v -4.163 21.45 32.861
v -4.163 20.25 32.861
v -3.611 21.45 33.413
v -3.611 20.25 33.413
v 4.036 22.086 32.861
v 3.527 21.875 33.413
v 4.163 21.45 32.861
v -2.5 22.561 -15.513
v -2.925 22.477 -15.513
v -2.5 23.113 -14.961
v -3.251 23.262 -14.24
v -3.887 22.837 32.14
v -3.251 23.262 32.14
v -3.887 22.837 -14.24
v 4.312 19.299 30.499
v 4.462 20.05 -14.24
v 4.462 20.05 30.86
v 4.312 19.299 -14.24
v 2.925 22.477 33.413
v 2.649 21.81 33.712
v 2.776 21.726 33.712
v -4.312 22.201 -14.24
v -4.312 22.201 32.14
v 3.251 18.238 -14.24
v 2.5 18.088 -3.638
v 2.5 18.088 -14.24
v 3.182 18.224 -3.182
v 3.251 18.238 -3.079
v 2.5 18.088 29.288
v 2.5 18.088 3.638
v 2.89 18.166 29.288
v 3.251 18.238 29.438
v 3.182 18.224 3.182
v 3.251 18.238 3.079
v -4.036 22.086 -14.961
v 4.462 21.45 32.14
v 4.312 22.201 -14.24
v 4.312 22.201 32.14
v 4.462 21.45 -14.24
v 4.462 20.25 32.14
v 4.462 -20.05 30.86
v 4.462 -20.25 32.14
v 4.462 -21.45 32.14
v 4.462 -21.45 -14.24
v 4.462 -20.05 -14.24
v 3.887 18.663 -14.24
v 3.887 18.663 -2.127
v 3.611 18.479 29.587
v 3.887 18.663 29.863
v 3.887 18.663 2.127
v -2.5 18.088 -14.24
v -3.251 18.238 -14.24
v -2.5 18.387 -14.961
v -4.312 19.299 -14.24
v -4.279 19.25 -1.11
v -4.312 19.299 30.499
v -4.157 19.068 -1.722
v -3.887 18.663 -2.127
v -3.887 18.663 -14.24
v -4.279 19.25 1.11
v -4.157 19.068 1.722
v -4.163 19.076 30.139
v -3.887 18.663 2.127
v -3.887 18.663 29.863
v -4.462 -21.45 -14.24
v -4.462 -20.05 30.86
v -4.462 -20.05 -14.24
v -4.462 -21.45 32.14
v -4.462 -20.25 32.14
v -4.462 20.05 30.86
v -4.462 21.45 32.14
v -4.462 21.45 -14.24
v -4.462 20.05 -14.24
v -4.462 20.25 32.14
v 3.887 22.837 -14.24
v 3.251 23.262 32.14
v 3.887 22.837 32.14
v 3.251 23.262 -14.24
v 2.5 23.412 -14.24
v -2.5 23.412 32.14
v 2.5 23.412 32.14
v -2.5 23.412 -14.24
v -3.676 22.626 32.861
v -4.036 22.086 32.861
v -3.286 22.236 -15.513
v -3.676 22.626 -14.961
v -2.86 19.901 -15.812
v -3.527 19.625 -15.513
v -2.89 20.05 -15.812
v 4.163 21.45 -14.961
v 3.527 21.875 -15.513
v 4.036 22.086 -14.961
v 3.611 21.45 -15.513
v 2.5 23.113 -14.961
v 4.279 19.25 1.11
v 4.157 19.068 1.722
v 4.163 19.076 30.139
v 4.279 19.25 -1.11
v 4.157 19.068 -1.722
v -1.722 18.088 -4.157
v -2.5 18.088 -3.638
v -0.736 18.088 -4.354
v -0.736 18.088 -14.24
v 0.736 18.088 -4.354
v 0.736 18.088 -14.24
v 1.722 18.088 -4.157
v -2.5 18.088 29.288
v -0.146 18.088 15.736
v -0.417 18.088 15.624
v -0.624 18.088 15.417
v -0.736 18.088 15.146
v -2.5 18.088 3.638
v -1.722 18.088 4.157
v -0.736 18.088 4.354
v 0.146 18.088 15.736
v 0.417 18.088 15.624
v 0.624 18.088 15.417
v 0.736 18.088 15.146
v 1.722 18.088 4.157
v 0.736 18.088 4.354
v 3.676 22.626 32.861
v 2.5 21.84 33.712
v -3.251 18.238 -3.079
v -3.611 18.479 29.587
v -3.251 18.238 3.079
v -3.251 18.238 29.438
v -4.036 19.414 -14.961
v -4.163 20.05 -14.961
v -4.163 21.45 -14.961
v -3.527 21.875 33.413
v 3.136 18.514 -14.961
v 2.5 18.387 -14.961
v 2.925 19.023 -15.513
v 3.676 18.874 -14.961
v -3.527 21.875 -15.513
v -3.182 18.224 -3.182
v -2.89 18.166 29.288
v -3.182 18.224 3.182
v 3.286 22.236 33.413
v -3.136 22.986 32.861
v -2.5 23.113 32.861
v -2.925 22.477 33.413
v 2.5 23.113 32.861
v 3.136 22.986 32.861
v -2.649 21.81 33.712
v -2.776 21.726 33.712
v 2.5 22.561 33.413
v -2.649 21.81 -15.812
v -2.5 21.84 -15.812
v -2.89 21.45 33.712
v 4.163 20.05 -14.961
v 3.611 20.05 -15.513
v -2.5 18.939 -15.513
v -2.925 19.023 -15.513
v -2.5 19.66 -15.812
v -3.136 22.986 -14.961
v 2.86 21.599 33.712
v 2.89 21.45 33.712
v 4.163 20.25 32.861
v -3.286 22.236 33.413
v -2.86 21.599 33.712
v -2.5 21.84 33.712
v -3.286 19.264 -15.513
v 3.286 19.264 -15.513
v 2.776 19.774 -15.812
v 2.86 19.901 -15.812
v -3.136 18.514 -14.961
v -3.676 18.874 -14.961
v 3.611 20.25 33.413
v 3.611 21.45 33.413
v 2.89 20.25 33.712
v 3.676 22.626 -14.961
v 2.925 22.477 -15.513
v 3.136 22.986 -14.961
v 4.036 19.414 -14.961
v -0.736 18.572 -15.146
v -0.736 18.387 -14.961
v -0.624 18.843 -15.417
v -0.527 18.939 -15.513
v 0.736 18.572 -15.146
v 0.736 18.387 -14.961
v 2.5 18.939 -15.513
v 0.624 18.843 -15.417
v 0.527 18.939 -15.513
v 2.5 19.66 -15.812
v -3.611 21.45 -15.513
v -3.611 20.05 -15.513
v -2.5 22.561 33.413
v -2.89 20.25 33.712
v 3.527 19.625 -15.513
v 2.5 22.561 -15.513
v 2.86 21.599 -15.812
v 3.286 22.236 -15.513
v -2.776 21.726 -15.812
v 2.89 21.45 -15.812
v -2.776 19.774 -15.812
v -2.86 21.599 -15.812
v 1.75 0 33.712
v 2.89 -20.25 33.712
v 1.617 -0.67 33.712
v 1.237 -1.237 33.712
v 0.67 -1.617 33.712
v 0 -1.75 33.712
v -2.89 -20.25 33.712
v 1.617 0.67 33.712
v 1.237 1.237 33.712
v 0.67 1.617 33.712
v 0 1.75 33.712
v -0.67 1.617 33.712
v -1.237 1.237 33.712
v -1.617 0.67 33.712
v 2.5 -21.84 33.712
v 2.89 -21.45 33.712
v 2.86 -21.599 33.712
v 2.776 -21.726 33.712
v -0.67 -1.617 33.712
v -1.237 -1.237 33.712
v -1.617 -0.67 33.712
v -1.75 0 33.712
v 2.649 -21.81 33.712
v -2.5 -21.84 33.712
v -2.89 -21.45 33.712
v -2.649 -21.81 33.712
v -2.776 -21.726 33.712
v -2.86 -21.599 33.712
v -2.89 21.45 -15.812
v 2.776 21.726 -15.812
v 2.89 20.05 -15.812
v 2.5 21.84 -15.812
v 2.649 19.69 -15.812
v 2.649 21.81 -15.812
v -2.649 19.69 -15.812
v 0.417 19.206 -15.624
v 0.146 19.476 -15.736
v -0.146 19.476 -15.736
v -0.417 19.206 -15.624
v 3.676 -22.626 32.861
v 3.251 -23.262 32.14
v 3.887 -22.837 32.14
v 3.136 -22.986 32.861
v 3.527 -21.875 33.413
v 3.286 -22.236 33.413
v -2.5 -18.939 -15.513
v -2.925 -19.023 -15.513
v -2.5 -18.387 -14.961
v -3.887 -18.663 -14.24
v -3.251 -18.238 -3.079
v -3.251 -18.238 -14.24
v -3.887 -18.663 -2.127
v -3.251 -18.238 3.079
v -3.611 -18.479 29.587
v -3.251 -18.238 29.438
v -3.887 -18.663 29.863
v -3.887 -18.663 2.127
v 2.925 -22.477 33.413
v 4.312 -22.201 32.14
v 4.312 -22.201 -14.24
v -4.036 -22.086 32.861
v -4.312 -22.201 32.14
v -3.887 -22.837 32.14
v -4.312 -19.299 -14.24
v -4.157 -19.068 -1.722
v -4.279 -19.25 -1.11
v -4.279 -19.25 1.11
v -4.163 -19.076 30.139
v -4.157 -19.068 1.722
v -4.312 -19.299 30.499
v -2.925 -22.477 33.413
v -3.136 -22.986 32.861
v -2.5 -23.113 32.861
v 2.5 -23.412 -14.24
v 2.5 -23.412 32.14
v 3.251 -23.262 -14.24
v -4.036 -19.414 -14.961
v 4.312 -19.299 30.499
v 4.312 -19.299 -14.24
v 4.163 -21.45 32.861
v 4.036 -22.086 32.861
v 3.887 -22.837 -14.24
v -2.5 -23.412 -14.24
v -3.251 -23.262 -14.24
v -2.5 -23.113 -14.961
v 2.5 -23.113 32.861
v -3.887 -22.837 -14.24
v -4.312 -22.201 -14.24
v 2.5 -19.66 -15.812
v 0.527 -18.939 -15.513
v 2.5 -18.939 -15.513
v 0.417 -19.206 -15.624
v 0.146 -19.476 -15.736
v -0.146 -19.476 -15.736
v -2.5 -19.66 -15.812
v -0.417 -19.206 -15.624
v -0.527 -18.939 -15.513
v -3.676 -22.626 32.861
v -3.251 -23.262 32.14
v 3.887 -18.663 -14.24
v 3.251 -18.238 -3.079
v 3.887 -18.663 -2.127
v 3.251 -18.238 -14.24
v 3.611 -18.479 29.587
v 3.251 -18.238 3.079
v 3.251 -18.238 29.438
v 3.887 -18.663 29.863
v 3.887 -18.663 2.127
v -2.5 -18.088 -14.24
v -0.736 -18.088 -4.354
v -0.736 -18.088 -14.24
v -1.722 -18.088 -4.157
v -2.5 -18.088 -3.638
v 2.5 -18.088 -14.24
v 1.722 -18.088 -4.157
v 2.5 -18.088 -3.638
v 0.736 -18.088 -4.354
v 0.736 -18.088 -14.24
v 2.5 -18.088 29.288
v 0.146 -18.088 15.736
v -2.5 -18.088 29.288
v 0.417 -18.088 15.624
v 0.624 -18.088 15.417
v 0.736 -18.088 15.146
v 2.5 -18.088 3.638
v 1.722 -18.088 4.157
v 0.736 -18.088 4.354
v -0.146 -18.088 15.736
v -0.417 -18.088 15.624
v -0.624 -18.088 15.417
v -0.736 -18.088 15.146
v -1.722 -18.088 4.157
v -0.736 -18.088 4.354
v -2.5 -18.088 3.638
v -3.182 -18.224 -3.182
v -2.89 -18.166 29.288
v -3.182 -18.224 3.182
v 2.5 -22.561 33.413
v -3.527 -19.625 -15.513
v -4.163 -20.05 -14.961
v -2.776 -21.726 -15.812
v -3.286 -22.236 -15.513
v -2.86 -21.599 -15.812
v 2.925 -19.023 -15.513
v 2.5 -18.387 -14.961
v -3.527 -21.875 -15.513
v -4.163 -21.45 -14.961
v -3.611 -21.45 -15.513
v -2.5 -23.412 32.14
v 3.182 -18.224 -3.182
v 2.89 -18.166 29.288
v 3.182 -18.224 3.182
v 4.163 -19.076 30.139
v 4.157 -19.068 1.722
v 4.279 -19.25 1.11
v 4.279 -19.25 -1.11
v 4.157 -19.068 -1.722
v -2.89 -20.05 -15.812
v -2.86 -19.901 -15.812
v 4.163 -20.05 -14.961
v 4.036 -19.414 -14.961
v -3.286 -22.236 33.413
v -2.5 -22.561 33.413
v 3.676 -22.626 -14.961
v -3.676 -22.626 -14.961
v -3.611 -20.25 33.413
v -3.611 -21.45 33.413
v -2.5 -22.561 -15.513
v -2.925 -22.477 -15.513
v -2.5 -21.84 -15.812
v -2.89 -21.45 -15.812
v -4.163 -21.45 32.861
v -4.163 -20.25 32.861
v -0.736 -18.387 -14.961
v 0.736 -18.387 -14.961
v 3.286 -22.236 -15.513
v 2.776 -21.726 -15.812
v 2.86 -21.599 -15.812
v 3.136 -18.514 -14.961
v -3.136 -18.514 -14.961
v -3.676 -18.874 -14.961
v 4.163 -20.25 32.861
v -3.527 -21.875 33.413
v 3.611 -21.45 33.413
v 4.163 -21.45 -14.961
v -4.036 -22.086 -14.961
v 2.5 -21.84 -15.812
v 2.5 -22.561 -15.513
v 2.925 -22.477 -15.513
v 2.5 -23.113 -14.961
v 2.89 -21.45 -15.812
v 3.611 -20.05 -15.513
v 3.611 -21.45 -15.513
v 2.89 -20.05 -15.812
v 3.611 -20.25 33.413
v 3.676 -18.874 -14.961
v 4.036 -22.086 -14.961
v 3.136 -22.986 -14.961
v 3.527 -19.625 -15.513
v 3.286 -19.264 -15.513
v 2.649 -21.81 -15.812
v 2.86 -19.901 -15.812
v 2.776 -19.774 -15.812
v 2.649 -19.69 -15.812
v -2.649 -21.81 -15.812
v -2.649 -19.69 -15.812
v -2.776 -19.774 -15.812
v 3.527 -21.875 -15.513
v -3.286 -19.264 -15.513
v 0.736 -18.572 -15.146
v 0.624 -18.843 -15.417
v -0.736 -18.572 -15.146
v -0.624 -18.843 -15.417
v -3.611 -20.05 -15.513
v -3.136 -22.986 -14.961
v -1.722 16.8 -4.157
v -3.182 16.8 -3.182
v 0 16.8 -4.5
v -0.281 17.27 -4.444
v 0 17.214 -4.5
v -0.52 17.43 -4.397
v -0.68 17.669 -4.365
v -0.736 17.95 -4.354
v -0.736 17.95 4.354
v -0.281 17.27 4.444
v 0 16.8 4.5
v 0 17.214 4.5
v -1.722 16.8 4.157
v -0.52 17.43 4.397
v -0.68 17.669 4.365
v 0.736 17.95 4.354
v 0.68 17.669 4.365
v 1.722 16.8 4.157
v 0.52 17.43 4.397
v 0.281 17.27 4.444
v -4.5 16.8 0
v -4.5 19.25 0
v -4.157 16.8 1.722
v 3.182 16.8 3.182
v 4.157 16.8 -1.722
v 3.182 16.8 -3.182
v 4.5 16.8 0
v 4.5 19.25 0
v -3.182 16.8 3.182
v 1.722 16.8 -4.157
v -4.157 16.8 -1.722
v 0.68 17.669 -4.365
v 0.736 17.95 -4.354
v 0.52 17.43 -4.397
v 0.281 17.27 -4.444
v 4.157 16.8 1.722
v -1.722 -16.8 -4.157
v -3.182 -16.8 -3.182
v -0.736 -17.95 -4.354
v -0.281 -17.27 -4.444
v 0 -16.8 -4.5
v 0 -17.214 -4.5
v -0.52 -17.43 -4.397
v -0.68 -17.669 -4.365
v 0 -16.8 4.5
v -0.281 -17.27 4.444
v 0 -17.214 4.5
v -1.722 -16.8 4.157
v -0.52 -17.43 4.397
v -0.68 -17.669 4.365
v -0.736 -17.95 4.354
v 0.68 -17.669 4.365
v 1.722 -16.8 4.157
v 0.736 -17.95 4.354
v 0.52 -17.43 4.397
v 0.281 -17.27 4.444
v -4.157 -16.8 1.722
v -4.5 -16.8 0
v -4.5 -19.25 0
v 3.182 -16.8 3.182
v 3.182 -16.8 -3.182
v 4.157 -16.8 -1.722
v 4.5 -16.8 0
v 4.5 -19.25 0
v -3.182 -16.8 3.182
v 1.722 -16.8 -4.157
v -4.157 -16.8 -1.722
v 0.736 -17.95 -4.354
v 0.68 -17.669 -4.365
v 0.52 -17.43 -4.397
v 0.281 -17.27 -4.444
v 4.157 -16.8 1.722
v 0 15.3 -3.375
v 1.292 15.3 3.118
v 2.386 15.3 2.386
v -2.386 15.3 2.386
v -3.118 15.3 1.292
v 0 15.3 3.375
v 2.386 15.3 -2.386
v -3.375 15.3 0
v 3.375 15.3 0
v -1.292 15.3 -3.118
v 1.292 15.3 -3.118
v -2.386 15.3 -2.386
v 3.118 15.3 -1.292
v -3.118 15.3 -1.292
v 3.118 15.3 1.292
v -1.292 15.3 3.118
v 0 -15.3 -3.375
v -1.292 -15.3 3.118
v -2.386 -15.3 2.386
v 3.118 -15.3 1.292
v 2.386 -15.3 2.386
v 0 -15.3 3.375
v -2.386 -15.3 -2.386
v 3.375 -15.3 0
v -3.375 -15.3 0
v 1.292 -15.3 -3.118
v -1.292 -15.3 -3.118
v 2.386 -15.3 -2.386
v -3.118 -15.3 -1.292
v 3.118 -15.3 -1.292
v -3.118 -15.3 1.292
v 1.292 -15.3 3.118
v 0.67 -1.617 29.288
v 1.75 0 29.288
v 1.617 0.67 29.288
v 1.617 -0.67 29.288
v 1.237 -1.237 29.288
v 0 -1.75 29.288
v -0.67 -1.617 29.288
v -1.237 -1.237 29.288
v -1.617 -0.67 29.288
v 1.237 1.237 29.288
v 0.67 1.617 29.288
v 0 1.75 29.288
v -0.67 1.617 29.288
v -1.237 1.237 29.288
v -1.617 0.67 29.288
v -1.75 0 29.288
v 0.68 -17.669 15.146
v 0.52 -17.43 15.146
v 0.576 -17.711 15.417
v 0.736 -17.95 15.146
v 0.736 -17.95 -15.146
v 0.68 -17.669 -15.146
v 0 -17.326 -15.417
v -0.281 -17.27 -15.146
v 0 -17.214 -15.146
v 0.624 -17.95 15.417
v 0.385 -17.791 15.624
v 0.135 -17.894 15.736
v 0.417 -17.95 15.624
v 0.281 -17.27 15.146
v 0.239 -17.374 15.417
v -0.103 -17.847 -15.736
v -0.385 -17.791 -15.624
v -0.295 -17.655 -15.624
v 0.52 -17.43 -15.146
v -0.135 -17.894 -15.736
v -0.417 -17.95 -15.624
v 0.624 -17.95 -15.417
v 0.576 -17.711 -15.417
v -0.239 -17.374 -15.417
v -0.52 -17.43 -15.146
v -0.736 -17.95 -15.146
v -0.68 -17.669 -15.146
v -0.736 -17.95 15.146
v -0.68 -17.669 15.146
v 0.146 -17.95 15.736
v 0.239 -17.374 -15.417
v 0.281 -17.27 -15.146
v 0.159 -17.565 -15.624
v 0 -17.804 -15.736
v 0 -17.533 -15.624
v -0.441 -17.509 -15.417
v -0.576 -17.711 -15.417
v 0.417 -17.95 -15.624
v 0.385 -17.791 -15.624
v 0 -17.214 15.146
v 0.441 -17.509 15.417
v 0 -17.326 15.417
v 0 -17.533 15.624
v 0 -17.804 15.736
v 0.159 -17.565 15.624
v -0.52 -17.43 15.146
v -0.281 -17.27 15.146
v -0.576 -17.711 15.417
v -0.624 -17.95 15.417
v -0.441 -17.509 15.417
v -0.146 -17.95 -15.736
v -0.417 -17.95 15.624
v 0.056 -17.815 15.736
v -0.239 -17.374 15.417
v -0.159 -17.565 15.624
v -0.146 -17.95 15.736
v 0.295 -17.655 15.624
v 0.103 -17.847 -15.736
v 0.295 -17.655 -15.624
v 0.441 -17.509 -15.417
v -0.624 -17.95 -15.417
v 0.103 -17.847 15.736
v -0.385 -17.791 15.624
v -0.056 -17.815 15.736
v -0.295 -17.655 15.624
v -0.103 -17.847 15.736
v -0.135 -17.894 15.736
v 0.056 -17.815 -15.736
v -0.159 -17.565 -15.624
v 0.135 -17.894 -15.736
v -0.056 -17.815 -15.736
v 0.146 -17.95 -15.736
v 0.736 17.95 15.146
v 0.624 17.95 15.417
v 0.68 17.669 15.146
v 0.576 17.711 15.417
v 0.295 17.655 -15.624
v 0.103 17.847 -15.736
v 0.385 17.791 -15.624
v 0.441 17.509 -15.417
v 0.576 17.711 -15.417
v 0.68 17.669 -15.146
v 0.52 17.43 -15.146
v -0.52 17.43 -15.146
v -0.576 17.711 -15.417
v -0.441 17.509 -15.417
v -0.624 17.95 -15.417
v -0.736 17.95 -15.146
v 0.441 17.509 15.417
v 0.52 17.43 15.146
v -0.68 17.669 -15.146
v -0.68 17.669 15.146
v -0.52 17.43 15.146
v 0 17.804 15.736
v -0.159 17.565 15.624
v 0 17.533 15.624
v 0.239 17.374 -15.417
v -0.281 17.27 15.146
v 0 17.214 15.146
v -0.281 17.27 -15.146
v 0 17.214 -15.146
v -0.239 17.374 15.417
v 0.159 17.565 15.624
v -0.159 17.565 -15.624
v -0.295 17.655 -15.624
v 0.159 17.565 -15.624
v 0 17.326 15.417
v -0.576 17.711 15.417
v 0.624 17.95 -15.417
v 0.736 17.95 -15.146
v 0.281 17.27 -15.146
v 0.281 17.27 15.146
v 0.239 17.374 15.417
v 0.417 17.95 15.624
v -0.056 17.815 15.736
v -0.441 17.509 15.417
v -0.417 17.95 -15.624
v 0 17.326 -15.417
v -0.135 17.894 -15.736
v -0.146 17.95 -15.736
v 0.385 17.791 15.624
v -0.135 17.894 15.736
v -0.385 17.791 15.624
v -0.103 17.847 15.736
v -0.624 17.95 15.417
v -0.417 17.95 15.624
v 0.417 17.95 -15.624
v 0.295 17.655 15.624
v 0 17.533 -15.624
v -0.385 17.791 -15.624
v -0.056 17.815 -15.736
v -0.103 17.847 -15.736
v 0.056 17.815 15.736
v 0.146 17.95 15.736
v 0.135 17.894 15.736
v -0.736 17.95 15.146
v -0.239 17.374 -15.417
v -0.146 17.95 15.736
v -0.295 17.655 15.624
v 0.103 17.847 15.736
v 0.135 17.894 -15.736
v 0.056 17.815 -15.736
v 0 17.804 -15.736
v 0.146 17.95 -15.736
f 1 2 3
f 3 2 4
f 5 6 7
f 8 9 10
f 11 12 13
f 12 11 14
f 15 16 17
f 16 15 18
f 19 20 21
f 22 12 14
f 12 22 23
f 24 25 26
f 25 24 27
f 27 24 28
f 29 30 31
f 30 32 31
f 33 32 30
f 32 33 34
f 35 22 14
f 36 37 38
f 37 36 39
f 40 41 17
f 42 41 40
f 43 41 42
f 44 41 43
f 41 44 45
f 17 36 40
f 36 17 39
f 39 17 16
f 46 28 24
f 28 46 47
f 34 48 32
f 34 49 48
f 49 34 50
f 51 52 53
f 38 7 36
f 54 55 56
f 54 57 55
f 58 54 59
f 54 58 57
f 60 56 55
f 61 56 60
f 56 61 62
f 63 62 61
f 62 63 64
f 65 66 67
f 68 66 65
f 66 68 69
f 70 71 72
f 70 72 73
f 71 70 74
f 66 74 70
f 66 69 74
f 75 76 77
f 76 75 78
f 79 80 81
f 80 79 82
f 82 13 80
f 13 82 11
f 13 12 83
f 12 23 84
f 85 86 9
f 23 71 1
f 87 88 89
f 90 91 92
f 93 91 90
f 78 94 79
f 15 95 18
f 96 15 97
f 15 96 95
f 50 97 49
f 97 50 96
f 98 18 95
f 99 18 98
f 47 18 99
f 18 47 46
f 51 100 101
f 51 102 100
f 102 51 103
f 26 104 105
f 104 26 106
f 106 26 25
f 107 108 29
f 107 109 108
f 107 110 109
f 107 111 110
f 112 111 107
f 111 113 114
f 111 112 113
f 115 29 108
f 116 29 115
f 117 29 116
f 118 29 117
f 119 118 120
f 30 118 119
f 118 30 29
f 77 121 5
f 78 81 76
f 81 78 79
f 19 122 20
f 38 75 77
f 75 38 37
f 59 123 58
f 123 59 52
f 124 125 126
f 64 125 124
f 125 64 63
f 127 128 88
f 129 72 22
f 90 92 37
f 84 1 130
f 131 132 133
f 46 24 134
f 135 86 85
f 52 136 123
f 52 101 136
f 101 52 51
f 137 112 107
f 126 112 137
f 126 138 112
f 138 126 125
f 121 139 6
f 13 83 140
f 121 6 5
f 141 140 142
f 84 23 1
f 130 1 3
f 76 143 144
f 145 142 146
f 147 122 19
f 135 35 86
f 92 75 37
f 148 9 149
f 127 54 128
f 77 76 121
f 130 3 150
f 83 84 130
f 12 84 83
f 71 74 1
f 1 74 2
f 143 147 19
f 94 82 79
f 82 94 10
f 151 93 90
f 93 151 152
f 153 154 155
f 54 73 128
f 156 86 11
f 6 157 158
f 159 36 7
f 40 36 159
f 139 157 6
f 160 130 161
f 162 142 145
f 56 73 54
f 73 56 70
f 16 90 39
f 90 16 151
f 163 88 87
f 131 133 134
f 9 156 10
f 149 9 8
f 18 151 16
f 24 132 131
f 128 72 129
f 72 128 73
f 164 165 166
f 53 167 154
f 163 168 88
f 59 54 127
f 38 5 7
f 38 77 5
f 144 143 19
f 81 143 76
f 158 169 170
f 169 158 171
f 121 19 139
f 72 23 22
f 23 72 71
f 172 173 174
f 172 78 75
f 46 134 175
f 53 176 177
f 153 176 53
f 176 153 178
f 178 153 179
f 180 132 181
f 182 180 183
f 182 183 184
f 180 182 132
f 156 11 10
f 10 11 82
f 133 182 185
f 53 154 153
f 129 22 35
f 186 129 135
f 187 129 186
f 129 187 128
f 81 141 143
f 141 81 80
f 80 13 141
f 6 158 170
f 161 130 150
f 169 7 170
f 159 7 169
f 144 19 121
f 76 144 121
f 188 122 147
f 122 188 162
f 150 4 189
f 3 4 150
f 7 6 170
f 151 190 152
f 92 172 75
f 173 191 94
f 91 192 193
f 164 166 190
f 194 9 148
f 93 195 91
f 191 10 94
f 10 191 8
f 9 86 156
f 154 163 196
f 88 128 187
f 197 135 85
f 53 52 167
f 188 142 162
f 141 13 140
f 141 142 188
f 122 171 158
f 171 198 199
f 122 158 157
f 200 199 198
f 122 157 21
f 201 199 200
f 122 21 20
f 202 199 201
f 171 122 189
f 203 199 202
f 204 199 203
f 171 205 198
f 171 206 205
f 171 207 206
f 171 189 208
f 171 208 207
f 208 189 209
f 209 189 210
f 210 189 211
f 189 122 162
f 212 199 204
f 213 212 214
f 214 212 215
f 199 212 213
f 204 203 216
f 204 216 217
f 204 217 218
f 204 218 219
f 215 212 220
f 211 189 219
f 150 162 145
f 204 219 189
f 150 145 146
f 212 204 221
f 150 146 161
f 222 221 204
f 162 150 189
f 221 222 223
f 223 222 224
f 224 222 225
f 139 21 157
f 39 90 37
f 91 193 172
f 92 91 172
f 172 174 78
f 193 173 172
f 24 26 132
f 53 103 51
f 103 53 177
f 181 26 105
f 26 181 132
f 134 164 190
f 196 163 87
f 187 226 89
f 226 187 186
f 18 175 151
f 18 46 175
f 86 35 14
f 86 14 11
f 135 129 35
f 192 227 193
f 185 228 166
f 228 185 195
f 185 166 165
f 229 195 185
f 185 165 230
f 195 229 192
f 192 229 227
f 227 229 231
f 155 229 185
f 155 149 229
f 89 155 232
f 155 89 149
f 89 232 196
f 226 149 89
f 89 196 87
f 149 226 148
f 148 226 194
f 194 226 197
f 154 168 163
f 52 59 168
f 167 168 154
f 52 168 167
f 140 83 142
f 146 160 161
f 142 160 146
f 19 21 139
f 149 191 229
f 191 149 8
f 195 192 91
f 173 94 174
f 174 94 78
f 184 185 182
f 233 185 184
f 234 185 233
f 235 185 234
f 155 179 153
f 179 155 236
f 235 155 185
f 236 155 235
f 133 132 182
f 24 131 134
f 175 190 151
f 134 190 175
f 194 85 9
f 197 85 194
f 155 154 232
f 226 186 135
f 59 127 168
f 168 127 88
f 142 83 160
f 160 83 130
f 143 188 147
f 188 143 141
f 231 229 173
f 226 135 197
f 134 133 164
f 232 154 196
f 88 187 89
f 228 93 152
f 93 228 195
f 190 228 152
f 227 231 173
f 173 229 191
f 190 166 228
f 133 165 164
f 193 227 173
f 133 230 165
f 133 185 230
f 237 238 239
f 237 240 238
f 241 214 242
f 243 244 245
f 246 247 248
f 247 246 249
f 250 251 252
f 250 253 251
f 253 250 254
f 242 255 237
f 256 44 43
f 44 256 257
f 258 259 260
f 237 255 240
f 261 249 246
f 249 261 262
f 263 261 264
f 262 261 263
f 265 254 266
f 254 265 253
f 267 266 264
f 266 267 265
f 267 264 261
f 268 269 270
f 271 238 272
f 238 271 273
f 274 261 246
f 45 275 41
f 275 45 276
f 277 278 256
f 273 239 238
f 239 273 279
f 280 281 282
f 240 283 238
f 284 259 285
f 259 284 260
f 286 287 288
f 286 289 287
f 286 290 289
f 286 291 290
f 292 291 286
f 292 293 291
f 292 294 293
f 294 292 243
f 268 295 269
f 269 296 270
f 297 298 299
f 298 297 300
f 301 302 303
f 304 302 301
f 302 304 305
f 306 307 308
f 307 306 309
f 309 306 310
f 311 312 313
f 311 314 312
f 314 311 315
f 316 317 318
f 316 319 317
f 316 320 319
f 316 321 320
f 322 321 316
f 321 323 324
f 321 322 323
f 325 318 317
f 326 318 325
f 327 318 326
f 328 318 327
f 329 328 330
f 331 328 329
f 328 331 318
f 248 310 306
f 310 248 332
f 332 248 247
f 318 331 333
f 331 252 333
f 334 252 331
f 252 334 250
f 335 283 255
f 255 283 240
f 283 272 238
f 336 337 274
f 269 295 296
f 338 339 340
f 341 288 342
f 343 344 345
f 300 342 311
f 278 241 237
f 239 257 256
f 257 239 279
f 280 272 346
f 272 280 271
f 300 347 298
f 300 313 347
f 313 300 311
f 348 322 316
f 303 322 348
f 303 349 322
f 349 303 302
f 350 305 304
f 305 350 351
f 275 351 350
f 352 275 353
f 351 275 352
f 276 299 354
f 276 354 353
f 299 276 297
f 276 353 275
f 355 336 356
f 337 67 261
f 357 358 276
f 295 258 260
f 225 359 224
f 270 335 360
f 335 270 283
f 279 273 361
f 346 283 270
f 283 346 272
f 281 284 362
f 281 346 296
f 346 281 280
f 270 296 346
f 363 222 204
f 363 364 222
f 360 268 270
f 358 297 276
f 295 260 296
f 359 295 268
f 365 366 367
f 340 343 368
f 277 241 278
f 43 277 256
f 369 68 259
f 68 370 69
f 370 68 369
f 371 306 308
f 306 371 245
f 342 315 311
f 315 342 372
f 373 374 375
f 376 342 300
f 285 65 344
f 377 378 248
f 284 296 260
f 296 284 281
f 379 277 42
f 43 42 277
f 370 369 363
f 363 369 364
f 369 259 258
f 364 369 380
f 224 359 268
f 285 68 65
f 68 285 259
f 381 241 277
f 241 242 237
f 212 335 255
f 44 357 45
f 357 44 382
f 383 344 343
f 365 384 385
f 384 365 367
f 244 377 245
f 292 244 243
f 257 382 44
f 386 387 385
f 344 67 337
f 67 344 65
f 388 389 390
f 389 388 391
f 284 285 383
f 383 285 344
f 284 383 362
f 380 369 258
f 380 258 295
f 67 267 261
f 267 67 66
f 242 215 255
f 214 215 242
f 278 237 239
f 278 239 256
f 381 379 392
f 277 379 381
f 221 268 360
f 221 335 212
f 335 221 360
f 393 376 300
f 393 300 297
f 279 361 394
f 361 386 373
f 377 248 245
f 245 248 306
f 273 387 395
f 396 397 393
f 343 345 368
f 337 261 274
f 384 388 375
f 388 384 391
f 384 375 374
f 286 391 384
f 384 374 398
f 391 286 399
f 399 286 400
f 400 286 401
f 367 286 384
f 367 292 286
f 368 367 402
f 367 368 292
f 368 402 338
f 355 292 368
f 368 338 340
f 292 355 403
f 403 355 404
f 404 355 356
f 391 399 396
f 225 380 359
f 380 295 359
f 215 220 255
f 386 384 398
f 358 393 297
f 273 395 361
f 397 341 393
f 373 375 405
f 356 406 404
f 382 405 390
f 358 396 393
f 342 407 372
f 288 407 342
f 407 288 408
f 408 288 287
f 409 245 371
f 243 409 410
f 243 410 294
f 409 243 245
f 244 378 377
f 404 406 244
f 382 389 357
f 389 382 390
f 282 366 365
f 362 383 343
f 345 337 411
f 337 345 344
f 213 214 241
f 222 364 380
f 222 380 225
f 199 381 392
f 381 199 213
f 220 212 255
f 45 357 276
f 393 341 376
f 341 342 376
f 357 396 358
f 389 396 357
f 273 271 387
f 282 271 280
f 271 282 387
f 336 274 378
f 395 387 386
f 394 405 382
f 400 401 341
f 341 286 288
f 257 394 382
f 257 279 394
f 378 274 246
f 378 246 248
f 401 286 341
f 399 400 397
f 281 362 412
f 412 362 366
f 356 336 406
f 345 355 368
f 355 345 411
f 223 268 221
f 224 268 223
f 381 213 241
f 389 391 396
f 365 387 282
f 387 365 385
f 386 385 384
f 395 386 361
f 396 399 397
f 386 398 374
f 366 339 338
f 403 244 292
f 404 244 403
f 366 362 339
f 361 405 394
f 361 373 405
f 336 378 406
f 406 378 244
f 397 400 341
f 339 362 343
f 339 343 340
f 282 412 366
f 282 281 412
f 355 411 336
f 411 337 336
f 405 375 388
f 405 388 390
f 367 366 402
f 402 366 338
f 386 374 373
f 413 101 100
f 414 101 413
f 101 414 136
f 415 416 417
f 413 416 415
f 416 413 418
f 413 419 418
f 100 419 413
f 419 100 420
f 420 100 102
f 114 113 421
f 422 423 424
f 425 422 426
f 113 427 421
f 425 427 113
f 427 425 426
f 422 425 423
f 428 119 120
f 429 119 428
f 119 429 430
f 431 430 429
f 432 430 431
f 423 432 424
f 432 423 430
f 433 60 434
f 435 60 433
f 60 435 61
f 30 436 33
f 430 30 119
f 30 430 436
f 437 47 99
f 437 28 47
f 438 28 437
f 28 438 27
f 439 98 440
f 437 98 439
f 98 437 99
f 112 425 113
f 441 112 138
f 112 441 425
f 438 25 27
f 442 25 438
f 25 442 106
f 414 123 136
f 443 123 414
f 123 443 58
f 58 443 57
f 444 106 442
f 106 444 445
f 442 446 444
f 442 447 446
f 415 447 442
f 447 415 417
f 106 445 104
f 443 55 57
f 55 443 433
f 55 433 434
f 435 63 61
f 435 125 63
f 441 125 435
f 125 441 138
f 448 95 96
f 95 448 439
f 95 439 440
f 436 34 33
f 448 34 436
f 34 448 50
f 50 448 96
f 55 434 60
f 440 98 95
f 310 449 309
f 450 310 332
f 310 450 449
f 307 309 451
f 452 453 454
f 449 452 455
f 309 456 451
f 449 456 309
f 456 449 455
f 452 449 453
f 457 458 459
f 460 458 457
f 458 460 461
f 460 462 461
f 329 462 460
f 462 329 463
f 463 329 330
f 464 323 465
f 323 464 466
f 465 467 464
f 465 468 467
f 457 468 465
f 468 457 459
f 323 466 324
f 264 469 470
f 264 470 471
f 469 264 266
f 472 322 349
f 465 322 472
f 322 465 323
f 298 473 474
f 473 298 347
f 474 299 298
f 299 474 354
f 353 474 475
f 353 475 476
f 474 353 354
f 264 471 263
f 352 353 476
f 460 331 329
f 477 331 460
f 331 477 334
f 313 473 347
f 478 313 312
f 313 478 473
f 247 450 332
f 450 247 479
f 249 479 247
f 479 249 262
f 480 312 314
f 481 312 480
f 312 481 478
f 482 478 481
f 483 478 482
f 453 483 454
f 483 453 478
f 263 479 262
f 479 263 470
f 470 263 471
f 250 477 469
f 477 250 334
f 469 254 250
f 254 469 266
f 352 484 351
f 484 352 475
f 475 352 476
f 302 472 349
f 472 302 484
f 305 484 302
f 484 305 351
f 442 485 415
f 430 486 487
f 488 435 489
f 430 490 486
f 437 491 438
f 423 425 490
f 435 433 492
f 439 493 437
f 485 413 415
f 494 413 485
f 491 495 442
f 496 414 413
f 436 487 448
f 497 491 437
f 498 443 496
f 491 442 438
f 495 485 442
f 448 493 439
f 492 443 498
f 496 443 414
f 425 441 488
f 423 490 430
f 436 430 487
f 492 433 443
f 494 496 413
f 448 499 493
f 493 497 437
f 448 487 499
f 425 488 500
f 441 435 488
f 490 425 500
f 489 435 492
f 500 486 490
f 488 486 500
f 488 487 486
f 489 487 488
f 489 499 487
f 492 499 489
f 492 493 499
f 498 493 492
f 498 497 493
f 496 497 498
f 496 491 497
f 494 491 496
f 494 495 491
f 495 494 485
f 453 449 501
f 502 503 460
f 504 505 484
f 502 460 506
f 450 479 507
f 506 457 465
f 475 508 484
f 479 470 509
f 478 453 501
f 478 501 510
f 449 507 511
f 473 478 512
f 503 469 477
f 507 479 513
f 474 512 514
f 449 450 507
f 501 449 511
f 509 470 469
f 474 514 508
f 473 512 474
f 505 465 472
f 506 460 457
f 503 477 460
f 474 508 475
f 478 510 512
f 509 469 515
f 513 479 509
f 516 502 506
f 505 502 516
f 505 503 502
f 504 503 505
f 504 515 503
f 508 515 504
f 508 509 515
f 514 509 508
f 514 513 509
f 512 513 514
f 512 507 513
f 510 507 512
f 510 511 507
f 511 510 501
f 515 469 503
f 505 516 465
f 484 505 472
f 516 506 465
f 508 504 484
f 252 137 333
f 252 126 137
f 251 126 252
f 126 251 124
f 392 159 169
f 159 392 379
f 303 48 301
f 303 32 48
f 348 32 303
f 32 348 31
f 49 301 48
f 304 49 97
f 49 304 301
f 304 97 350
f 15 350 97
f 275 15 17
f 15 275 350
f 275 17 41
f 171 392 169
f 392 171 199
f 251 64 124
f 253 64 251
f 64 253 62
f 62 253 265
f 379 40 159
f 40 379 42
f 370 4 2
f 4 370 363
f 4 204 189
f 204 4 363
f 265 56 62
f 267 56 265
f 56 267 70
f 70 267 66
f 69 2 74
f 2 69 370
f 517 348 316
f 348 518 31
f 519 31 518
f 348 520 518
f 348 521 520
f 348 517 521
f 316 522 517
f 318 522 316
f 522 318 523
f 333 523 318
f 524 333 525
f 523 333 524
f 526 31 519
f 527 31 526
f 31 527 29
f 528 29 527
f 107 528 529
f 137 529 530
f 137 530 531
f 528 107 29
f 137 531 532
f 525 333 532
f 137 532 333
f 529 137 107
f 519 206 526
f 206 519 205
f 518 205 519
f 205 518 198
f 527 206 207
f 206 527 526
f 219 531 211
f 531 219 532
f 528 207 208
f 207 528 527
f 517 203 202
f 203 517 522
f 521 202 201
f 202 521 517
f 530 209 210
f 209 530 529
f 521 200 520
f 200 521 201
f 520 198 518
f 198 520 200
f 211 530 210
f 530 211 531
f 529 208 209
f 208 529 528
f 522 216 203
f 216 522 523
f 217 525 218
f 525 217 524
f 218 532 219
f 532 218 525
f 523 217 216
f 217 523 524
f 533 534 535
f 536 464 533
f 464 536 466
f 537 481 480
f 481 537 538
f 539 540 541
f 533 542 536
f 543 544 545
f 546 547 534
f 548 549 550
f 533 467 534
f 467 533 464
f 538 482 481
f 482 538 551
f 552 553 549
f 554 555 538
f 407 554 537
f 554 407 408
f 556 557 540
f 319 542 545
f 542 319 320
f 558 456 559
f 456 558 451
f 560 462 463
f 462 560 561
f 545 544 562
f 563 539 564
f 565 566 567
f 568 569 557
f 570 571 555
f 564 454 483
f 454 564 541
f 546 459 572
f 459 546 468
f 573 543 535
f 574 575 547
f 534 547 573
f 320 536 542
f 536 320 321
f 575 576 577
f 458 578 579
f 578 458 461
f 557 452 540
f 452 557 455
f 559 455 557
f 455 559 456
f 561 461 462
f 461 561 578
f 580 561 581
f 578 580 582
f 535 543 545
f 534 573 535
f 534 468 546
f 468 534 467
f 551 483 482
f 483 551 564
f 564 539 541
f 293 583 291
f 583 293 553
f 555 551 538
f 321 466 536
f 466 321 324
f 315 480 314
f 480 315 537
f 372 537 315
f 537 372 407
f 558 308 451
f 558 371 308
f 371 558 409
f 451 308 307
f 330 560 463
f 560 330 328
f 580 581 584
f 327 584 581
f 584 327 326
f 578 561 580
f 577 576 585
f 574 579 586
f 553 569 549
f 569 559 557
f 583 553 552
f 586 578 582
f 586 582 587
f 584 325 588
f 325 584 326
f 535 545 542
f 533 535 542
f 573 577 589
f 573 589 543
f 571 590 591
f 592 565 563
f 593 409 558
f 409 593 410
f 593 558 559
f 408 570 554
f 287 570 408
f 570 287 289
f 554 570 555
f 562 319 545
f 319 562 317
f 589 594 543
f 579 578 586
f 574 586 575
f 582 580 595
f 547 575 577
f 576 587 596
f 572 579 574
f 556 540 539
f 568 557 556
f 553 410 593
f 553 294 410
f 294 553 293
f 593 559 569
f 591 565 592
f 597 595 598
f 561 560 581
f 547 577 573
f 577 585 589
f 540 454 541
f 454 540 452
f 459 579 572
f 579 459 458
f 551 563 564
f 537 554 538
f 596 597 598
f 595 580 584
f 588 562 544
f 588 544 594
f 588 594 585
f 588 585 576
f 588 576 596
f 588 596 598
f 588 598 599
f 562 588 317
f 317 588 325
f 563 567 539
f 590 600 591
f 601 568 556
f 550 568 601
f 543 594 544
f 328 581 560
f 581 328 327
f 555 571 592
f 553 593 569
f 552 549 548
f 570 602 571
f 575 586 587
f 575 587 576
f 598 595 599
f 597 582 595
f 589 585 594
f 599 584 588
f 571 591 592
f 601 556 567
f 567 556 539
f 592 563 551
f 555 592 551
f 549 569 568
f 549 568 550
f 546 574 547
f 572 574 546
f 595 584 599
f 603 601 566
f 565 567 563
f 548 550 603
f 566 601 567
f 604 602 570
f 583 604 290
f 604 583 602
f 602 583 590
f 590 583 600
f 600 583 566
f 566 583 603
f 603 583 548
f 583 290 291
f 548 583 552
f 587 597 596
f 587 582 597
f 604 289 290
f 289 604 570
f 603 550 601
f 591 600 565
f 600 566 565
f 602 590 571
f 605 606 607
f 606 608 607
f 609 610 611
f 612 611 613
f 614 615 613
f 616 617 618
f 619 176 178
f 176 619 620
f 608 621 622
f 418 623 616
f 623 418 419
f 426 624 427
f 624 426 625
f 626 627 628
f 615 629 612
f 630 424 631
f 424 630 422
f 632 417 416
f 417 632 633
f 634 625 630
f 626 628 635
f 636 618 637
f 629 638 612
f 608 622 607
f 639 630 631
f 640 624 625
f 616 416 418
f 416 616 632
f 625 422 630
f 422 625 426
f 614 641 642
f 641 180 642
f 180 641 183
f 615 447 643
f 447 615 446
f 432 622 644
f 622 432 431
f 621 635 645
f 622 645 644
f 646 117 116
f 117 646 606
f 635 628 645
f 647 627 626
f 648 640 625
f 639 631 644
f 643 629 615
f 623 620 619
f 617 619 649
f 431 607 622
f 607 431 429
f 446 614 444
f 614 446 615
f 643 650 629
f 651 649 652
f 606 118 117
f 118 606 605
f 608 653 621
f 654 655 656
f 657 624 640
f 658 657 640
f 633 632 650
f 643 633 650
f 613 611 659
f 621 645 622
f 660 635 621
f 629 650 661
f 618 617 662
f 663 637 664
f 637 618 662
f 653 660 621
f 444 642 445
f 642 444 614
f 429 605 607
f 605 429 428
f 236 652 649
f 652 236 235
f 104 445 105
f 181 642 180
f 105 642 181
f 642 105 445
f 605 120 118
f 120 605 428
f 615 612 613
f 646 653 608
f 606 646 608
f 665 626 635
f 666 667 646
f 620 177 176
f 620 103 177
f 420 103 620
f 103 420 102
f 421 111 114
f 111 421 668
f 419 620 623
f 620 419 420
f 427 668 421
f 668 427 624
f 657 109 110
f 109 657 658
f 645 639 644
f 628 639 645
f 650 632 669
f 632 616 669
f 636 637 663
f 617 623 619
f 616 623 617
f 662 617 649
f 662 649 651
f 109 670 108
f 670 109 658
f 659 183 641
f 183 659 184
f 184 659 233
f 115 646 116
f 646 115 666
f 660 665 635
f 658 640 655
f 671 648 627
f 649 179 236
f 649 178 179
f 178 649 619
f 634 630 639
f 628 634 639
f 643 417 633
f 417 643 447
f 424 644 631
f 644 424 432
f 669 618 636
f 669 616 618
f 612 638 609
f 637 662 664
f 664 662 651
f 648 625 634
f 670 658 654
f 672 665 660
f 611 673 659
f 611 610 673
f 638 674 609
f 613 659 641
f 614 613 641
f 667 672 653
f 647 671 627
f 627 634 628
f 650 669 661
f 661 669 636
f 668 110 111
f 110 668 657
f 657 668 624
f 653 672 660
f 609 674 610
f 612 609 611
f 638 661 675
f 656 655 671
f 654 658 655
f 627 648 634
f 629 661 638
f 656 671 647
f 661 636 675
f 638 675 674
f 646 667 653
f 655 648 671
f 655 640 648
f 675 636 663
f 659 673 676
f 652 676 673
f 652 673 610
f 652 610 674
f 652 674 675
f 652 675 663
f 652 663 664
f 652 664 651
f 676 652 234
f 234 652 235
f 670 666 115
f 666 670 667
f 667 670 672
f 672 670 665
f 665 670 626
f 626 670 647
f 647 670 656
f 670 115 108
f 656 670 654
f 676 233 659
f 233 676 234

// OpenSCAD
$fn = 16;


union() {
	difference() {
		union() {
			translate(v = [0, 16.8000000000, 0]) {
				rotate(a = [180, 90, 90]) {
					cylinder(d1 = 9, d2 = 6.7500000000, h = 1.5000000000);
				}
			}
			translate(v = [0, -16.8000000000, 0]) {
				rotate(a = [0, 90, 90]) {
					cylinder(d1 = 9, d2 = 6.7500000000, h = 1.5000000000);
				}
			}
			translate(v = [0, 0, 29.2500000000]) {
				hull() {
					union() {
						translate(v = [2.5000000000, 20.2500000000, 2]) {
							sphere(r = 2);
						}
						translate(v = [-2.5000000000, 20.2500000000, 2]) {
							sphere(r = 2);
						}
						translate(v = [2.5000000000, -20.2500000000, 2]) {
							sphere(r = 2);
						}
						translate(v = [-2.5000000000, -20.2500000000, 2]) {
							sphere(r = 2);
						}
						translate(v = [2.5000000000, 20.2500000000, 2.5000000000]) {
							sphere(r = 2);
						}
						translate(v = [-2.5000000000, 20.2500000000, 2.5000000000]) {
							sphere(r = 2);
						}
						translate(v = [2.5000000000, -20.2500000000, 2.5000000000]) {
							sphere(r = 2);
						}
						translate(v = [-2.5000000000, -20.2500000000, 2.5000000000]) {
							sphere(r = 2);
						}
					}
				}
			}
			union() {
				translate(v = [0, 20.7500000000, 0]) {
					translate(v = [0, 0, -15.8500000000]) {
						hull() {
							union() {
								translate(v = [2.5000000000, 0.7000000000, 2]) {
									sphere(r = 2);
								}
								translate(v = [-2.5000000000, 0.7000000000, 2]) {
									sphere(r = 2);
								}
								translate(v = [2.5000000000, -0.7000000000, 2]) {
									sphere(r = 2);
								}
								translate(v = [-2.5000000000, -0.7000000000, 2]) {
									sphere(r = 2);
								}
								translate(v = [2.5000000000, 0.7000000000, 47.6000000000]) {
									sphere(r = 2);
								}
								translate(v = [-2.5000000000, 0.7000000000, 47.6000000000]) {
									sphere(r = 2);
								}
								translate(v = [2.5000000000, -0.7000000000, 47.6000000000]) {
									sphere(r = 2);
								}
								translate(v = [-2.5000000000, -0.7000000000, 47.6000000000]) {
									sphere(r = 2);
								}
							}
						}
					}
				}
				translate(v = [0, -20.7500000000, 0]) {
					translate(v = [0, 0, -15.8500000000]) {
						hull() {
							union() {
								translate(v = [2.5000000000, 0.7000000000, 2]) {
									sphere(r = 2);
								}
								translate(v = [-2.5000000000, 0.7000000000, 2]) {
									sphere(r = 2);
								}
								translate(v = [2.5000000000, -0.7000000000, 2]) {
									sphere(r = 2);
								}
								translate(v = [-2.5000000000, -0.7000000000, 2]) {
									sphere(r = 2);
								}
								translate(v = [2.5000000000, 0.7000000000, 47.6000000000]) {
									sphere(r = 2);
								}
								translate(v = [-2.5000000000, 0.7000000000, 47.6000000000]) {
									sphere(r = 2);
								}
								translate(v = [2.5000000000, -0.7000000000, 47.6000000000]) {
									sphere(r = 2);
								}
								translate(v = [-2.5000000000, -0.7000000000, 47.6000000000]) {
									sphere(r = 2);
								}
							}
						}
					}
				}
			}
			union() {
				translate(v = [0, 16.8000000000, 0]) {
					rotate(a = [0, 90, 90]) {
						cylinder(d = 9, h = 2.4500000000);
					}
				}
				translate(v = [0, -19.2500000000, 0]) {
					rotate(a = [0, 90, 90]) {
						cylinder(d = 9, h = 2.4500000000);
					}
				}
			}
		}
		translate(v = [0, 0, 20.2500000000]) {
			cylinder(d = 3.5000000000, h = 18);
		}
	}
	union() {
		translate(v = [0, -18.7500000000, 0]) {
			hull() {
				union() {
					translate(v = [0, 0.8000000000, -15]) {
						sphere(d = 1.5000000000);
					}
					translate(v = [0, 0.8000000000, 15]) {
						sphere(d = 1.5000000000);
					}
					translate(v = [0, -0.8000000000, -15]) {
						sphere(d = 1.5000000000);
					}
					translate(v = [0, -0.8000000000, 15]) {
						sphere(d = 1.5000000000);
					}
				}
			}
		}
		translate(v = [0, 18.7500000000, 0]) {
			hull() {
				union() {
					translate(v = [0, 0.8000000000, -15]) {
						sphere(d = 1.5000000000);
					}
					translate(v = [0, 0.8000000000, 15]) {
						sphere(d = 1.5000000000);
					}
					translate(v = [0, -0.8000000000, -15]) {
						sphere(d = 1.5000000000);
					}
					translate(v = [0, -0.8000000000, 15]) {
						sphere(d = 1.5000000000);
					}
				}
			}
		}
	}
}
